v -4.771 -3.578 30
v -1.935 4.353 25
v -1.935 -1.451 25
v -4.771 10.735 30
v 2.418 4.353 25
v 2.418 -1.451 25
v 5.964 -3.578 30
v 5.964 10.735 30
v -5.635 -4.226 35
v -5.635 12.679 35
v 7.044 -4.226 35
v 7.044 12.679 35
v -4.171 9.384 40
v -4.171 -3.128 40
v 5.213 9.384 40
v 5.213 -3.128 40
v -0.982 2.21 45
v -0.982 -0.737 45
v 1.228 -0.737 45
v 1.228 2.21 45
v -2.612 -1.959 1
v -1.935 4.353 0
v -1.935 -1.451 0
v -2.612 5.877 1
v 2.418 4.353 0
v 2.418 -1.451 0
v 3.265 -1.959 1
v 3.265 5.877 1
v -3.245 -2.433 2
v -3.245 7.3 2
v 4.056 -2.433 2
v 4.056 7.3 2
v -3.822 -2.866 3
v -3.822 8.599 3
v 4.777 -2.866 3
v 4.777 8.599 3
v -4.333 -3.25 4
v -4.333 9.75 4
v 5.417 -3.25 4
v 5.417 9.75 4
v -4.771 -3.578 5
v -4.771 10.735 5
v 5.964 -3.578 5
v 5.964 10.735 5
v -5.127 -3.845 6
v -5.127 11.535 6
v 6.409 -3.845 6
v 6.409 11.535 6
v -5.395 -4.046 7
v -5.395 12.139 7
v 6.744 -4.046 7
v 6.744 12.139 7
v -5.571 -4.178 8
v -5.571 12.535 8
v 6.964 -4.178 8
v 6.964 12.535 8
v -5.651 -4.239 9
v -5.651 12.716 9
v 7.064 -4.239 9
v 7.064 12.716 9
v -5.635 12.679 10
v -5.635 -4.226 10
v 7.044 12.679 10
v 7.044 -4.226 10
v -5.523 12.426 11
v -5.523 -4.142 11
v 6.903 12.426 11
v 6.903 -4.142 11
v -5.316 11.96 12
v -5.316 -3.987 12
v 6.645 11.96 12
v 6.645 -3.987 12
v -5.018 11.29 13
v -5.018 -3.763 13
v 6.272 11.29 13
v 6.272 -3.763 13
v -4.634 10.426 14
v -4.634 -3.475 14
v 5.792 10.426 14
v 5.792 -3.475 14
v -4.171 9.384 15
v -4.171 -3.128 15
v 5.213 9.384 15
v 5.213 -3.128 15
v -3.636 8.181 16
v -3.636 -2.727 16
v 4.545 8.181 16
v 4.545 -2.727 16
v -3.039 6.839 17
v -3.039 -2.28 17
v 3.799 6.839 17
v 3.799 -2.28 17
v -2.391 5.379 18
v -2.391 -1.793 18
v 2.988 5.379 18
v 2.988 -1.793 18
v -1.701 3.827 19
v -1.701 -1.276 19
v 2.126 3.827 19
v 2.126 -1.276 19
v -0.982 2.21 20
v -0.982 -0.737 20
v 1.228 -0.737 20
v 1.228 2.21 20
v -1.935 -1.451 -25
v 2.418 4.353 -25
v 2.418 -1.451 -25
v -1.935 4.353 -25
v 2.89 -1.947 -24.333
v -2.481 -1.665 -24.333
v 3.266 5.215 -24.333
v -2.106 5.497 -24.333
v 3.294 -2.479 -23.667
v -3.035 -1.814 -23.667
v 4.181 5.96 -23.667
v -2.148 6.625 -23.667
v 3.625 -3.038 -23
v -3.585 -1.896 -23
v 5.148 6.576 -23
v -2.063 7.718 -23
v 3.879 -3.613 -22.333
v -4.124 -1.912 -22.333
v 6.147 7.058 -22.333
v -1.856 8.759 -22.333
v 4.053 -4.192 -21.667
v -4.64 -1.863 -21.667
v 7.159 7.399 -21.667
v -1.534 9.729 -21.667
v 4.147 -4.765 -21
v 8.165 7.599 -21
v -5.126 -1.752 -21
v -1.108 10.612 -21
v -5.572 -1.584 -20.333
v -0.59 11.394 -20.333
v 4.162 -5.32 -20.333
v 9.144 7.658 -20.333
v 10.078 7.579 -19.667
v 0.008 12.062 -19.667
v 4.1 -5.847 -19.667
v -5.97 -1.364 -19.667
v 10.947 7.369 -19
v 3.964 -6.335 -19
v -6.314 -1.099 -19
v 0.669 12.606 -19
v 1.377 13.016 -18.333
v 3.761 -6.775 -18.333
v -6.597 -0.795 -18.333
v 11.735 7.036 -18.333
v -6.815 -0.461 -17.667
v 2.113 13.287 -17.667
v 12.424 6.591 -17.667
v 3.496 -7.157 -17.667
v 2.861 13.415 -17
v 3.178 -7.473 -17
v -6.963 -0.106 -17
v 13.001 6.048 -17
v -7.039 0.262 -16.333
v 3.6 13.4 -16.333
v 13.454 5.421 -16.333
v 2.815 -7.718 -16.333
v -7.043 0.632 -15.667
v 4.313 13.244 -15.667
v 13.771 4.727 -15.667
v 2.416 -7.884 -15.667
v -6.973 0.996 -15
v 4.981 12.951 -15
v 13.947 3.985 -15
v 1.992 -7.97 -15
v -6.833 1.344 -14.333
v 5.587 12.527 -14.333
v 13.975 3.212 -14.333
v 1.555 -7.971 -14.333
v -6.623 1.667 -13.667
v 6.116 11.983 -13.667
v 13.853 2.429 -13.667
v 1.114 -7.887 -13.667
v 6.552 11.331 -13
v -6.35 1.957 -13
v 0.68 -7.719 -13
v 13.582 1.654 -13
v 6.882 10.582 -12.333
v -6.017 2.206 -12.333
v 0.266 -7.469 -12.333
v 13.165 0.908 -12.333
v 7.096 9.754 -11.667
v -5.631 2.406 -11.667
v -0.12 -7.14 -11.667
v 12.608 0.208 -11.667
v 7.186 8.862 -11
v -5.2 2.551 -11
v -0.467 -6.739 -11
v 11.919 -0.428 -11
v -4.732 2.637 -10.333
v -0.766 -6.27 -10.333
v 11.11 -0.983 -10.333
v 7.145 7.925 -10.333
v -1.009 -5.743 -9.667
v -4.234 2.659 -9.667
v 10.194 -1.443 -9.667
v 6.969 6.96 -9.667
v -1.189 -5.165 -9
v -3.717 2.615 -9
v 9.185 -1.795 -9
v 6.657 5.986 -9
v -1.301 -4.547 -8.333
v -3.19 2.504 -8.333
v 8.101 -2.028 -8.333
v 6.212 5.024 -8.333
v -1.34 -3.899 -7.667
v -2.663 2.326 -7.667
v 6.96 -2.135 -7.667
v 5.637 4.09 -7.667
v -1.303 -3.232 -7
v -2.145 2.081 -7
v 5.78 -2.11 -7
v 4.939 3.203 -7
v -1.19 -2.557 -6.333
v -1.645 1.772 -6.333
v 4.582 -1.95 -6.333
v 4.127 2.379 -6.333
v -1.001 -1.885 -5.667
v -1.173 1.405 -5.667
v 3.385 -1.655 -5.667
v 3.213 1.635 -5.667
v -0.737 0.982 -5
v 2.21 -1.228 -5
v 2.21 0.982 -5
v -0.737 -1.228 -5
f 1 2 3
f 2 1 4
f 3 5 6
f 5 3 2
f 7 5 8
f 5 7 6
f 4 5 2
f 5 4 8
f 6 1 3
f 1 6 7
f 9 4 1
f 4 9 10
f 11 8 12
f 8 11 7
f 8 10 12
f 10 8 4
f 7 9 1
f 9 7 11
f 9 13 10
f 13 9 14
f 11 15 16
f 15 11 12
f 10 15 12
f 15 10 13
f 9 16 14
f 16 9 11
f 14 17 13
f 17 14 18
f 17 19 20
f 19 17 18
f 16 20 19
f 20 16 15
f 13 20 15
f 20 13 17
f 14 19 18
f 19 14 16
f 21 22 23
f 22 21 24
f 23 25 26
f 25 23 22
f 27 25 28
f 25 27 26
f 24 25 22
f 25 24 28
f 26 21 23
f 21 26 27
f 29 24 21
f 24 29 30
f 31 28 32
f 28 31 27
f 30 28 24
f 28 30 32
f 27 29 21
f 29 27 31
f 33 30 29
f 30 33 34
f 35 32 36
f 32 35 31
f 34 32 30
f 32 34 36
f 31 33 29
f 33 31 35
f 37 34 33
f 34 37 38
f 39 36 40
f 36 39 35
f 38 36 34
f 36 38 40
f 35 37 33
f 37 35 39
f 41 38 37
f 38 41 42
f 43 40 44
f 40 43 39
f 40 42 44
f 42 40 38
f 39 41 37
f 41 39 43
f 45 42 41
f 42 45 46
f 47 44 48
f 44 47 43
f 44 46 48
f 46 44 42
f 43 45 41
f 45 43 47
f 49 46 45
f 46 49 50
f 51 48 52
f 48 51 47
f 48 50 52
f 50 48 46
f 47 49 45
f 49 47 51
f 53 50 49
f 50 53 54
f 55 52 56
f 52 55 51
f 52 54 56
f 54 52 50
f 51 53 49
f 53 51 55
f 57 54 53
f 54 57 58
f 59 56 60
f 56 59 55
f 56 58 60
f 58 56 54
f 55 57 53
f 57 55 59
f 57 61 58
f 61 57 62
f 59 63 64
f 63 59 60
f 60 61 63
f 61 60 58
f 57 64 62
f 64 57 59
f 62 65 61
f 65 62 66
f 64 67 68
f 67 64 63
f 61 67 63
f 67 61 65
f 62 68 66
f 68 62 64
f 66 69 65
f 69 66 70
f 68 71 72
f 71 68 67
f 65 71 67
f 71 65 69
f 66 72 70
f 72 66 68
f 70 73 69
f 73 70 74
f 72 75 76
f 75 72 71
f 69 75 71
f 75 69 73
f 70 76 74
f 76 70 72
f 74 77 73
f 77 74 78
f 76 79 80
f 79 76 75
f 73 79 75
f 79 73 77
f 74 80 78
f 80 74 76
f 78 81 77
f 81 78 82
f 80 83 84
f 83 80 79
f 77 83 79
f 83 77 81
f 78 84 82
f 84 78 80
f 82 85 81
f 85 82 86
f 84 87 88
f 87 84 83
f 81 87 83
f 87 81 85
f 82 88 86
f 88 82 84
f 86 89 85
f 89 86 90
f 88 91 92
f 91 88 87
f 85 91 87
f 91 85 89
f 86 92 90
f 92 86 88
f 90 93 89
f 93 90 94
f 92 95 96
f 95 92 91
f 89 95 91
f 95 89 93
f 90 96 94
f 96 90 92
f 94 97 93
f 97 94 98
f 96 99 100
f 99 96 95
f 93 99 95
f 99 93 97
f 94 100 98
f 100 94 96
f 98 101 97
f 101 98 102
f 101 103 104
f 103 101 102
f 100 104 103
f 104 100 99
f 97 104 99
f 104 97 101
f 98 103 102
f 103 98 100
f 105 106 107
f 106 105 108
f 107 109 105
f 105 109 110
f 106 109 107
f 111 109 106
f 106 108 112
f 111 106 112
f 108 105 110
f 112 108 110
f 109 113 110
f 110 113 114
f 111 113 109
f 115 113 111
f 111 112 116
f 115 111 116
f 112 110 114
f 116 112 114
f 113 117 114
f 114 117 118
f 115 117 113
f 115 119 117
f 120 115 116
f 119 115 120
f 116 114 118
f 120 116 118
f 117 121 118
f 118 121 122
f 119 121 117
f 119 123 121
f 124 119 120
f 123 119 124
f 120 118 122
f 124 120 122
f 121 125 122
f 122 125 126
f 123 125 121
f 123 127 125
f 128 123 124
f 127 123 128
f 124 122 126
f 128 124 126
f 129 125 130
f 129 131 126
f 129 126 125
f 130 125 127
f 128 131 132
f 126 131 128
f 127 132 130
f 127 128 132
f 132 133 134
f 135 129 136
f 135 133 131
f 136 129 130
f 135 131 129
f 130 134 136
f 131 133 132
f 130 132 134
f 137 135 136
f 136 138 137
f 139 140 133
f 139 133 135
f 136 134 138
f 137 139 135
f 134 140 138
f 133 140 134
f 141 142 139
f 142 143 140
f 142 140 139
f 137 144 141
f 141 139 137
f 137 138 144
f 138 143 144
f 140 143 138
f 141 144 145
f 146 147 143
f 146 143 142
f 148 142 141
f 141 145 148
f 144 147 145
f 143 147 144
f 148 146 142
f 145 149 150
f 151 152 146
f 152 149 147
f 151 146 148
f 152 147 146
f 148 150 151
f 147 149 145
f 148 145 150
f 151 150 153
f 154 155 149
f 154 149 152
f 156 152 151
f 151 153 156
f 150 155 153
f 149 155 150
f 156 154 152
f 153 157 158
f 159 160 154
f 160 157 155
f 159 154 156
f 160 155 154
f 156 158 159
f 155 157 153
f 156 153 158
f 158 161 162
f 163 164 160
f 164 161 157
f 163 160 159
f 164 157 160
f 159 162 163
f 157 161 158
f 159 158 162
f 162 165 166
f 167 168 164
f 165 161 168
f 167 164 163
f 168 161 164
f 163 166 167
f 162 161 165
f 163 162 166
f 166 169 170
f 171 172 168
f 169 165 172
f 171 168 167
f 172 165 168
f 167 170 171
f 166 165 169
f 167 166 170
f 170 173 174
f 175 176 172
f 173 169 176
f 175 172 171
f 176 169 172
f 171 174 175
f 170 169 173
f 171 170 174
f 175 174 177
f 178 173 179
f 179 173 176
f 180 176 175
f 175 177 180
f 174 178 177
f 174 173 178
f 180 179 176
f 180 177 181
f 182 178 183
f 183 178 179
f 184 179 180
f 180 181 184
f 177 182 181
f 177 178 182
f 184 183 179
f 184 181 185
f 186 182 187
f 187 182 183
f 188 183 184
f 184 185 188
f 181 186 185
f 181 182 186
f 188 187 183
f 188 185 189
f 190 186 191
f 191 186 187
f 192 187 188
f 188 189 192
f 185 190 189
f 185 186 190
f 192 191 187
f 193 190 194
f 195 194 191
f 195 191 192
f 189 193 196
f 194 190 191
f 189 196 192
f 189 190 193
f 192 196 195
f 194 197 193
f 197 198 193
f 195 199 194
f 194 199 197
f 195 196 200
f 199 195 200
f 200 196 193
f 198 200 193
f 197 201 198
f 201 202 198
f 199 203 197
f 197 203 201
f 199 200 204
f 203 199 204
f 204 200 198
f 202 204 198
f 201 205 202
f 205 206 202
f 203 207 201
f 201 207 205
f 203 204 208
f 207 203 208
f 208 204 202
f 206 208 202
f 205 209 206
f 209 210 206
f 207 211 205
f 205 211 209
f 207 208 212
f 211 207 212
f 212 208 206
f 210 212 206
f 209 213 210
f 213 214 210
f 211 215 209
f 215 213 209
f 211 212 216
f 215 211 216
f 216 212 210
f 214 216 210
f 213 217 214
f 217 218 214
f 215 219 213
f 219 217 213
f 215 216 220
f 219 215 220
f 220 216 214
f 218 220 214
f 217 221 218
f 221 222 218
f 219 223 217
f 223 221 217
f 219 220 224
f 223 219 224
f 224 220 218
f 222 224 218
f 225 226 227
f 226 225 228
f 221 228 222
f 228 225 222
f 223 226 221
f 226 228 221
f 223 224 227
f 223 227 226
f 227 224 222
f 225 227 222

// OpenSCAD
//Linear Extrude with Scale as an interpolated function
// This module does not need to be modified,
// - unless default parameters want to be changed
// - or additional parameters want to be forwarded (e.g. slices,...)
module linear_extrude_fs(height=1,isteps=20,twist=0){
 //union of piecewise generated extrudes
 union(){
   for(i = [ 0: 1: isteps-1]){
     //each new piece needs to be adjusted for height
     translate([0,0,i*height/isteps])
      linear_extrude(
       height=height/isteps,
       twist=twist/isteps,
       scale=f_lefs((i+1)/isteps)/f_lefs(i/isteps)
      )
       // if a twist constant is defined it is split into pieces
       rotate([0,0,-(i/isteps)*twist])
        // each new piece starts where the last ended
        scale(f_lefs(i/isteps))
         obj2D_lefs();
   }
 }
}
// This function defines the scale function
// - Function name must not be modified
// - Modify the contents/return value to define the function
function f_lefs(x) =
 let(span=150,start=20,normpos=45)
 sin(x*span+start)/sin(normpos);
// This module defines the base 2D object to be extruded
// - Function name must not be modified
// - Modify the contents to define the base 2D object
module obj2D_lefs(){
 translate([-4,-3])
  square([9,12]);
}
//Top rendered object demonstrating the interpolation steps
translate([0,0,25])
linear_extrude_fs(height=20,isteps=4);
linear_extrude_fs(height=20);
//Bottom rendered object demonstrating the inclusion of a twist
translate([0,0,-25])
linear_extrude_fs(height=20,twist=90,isteps=30);
